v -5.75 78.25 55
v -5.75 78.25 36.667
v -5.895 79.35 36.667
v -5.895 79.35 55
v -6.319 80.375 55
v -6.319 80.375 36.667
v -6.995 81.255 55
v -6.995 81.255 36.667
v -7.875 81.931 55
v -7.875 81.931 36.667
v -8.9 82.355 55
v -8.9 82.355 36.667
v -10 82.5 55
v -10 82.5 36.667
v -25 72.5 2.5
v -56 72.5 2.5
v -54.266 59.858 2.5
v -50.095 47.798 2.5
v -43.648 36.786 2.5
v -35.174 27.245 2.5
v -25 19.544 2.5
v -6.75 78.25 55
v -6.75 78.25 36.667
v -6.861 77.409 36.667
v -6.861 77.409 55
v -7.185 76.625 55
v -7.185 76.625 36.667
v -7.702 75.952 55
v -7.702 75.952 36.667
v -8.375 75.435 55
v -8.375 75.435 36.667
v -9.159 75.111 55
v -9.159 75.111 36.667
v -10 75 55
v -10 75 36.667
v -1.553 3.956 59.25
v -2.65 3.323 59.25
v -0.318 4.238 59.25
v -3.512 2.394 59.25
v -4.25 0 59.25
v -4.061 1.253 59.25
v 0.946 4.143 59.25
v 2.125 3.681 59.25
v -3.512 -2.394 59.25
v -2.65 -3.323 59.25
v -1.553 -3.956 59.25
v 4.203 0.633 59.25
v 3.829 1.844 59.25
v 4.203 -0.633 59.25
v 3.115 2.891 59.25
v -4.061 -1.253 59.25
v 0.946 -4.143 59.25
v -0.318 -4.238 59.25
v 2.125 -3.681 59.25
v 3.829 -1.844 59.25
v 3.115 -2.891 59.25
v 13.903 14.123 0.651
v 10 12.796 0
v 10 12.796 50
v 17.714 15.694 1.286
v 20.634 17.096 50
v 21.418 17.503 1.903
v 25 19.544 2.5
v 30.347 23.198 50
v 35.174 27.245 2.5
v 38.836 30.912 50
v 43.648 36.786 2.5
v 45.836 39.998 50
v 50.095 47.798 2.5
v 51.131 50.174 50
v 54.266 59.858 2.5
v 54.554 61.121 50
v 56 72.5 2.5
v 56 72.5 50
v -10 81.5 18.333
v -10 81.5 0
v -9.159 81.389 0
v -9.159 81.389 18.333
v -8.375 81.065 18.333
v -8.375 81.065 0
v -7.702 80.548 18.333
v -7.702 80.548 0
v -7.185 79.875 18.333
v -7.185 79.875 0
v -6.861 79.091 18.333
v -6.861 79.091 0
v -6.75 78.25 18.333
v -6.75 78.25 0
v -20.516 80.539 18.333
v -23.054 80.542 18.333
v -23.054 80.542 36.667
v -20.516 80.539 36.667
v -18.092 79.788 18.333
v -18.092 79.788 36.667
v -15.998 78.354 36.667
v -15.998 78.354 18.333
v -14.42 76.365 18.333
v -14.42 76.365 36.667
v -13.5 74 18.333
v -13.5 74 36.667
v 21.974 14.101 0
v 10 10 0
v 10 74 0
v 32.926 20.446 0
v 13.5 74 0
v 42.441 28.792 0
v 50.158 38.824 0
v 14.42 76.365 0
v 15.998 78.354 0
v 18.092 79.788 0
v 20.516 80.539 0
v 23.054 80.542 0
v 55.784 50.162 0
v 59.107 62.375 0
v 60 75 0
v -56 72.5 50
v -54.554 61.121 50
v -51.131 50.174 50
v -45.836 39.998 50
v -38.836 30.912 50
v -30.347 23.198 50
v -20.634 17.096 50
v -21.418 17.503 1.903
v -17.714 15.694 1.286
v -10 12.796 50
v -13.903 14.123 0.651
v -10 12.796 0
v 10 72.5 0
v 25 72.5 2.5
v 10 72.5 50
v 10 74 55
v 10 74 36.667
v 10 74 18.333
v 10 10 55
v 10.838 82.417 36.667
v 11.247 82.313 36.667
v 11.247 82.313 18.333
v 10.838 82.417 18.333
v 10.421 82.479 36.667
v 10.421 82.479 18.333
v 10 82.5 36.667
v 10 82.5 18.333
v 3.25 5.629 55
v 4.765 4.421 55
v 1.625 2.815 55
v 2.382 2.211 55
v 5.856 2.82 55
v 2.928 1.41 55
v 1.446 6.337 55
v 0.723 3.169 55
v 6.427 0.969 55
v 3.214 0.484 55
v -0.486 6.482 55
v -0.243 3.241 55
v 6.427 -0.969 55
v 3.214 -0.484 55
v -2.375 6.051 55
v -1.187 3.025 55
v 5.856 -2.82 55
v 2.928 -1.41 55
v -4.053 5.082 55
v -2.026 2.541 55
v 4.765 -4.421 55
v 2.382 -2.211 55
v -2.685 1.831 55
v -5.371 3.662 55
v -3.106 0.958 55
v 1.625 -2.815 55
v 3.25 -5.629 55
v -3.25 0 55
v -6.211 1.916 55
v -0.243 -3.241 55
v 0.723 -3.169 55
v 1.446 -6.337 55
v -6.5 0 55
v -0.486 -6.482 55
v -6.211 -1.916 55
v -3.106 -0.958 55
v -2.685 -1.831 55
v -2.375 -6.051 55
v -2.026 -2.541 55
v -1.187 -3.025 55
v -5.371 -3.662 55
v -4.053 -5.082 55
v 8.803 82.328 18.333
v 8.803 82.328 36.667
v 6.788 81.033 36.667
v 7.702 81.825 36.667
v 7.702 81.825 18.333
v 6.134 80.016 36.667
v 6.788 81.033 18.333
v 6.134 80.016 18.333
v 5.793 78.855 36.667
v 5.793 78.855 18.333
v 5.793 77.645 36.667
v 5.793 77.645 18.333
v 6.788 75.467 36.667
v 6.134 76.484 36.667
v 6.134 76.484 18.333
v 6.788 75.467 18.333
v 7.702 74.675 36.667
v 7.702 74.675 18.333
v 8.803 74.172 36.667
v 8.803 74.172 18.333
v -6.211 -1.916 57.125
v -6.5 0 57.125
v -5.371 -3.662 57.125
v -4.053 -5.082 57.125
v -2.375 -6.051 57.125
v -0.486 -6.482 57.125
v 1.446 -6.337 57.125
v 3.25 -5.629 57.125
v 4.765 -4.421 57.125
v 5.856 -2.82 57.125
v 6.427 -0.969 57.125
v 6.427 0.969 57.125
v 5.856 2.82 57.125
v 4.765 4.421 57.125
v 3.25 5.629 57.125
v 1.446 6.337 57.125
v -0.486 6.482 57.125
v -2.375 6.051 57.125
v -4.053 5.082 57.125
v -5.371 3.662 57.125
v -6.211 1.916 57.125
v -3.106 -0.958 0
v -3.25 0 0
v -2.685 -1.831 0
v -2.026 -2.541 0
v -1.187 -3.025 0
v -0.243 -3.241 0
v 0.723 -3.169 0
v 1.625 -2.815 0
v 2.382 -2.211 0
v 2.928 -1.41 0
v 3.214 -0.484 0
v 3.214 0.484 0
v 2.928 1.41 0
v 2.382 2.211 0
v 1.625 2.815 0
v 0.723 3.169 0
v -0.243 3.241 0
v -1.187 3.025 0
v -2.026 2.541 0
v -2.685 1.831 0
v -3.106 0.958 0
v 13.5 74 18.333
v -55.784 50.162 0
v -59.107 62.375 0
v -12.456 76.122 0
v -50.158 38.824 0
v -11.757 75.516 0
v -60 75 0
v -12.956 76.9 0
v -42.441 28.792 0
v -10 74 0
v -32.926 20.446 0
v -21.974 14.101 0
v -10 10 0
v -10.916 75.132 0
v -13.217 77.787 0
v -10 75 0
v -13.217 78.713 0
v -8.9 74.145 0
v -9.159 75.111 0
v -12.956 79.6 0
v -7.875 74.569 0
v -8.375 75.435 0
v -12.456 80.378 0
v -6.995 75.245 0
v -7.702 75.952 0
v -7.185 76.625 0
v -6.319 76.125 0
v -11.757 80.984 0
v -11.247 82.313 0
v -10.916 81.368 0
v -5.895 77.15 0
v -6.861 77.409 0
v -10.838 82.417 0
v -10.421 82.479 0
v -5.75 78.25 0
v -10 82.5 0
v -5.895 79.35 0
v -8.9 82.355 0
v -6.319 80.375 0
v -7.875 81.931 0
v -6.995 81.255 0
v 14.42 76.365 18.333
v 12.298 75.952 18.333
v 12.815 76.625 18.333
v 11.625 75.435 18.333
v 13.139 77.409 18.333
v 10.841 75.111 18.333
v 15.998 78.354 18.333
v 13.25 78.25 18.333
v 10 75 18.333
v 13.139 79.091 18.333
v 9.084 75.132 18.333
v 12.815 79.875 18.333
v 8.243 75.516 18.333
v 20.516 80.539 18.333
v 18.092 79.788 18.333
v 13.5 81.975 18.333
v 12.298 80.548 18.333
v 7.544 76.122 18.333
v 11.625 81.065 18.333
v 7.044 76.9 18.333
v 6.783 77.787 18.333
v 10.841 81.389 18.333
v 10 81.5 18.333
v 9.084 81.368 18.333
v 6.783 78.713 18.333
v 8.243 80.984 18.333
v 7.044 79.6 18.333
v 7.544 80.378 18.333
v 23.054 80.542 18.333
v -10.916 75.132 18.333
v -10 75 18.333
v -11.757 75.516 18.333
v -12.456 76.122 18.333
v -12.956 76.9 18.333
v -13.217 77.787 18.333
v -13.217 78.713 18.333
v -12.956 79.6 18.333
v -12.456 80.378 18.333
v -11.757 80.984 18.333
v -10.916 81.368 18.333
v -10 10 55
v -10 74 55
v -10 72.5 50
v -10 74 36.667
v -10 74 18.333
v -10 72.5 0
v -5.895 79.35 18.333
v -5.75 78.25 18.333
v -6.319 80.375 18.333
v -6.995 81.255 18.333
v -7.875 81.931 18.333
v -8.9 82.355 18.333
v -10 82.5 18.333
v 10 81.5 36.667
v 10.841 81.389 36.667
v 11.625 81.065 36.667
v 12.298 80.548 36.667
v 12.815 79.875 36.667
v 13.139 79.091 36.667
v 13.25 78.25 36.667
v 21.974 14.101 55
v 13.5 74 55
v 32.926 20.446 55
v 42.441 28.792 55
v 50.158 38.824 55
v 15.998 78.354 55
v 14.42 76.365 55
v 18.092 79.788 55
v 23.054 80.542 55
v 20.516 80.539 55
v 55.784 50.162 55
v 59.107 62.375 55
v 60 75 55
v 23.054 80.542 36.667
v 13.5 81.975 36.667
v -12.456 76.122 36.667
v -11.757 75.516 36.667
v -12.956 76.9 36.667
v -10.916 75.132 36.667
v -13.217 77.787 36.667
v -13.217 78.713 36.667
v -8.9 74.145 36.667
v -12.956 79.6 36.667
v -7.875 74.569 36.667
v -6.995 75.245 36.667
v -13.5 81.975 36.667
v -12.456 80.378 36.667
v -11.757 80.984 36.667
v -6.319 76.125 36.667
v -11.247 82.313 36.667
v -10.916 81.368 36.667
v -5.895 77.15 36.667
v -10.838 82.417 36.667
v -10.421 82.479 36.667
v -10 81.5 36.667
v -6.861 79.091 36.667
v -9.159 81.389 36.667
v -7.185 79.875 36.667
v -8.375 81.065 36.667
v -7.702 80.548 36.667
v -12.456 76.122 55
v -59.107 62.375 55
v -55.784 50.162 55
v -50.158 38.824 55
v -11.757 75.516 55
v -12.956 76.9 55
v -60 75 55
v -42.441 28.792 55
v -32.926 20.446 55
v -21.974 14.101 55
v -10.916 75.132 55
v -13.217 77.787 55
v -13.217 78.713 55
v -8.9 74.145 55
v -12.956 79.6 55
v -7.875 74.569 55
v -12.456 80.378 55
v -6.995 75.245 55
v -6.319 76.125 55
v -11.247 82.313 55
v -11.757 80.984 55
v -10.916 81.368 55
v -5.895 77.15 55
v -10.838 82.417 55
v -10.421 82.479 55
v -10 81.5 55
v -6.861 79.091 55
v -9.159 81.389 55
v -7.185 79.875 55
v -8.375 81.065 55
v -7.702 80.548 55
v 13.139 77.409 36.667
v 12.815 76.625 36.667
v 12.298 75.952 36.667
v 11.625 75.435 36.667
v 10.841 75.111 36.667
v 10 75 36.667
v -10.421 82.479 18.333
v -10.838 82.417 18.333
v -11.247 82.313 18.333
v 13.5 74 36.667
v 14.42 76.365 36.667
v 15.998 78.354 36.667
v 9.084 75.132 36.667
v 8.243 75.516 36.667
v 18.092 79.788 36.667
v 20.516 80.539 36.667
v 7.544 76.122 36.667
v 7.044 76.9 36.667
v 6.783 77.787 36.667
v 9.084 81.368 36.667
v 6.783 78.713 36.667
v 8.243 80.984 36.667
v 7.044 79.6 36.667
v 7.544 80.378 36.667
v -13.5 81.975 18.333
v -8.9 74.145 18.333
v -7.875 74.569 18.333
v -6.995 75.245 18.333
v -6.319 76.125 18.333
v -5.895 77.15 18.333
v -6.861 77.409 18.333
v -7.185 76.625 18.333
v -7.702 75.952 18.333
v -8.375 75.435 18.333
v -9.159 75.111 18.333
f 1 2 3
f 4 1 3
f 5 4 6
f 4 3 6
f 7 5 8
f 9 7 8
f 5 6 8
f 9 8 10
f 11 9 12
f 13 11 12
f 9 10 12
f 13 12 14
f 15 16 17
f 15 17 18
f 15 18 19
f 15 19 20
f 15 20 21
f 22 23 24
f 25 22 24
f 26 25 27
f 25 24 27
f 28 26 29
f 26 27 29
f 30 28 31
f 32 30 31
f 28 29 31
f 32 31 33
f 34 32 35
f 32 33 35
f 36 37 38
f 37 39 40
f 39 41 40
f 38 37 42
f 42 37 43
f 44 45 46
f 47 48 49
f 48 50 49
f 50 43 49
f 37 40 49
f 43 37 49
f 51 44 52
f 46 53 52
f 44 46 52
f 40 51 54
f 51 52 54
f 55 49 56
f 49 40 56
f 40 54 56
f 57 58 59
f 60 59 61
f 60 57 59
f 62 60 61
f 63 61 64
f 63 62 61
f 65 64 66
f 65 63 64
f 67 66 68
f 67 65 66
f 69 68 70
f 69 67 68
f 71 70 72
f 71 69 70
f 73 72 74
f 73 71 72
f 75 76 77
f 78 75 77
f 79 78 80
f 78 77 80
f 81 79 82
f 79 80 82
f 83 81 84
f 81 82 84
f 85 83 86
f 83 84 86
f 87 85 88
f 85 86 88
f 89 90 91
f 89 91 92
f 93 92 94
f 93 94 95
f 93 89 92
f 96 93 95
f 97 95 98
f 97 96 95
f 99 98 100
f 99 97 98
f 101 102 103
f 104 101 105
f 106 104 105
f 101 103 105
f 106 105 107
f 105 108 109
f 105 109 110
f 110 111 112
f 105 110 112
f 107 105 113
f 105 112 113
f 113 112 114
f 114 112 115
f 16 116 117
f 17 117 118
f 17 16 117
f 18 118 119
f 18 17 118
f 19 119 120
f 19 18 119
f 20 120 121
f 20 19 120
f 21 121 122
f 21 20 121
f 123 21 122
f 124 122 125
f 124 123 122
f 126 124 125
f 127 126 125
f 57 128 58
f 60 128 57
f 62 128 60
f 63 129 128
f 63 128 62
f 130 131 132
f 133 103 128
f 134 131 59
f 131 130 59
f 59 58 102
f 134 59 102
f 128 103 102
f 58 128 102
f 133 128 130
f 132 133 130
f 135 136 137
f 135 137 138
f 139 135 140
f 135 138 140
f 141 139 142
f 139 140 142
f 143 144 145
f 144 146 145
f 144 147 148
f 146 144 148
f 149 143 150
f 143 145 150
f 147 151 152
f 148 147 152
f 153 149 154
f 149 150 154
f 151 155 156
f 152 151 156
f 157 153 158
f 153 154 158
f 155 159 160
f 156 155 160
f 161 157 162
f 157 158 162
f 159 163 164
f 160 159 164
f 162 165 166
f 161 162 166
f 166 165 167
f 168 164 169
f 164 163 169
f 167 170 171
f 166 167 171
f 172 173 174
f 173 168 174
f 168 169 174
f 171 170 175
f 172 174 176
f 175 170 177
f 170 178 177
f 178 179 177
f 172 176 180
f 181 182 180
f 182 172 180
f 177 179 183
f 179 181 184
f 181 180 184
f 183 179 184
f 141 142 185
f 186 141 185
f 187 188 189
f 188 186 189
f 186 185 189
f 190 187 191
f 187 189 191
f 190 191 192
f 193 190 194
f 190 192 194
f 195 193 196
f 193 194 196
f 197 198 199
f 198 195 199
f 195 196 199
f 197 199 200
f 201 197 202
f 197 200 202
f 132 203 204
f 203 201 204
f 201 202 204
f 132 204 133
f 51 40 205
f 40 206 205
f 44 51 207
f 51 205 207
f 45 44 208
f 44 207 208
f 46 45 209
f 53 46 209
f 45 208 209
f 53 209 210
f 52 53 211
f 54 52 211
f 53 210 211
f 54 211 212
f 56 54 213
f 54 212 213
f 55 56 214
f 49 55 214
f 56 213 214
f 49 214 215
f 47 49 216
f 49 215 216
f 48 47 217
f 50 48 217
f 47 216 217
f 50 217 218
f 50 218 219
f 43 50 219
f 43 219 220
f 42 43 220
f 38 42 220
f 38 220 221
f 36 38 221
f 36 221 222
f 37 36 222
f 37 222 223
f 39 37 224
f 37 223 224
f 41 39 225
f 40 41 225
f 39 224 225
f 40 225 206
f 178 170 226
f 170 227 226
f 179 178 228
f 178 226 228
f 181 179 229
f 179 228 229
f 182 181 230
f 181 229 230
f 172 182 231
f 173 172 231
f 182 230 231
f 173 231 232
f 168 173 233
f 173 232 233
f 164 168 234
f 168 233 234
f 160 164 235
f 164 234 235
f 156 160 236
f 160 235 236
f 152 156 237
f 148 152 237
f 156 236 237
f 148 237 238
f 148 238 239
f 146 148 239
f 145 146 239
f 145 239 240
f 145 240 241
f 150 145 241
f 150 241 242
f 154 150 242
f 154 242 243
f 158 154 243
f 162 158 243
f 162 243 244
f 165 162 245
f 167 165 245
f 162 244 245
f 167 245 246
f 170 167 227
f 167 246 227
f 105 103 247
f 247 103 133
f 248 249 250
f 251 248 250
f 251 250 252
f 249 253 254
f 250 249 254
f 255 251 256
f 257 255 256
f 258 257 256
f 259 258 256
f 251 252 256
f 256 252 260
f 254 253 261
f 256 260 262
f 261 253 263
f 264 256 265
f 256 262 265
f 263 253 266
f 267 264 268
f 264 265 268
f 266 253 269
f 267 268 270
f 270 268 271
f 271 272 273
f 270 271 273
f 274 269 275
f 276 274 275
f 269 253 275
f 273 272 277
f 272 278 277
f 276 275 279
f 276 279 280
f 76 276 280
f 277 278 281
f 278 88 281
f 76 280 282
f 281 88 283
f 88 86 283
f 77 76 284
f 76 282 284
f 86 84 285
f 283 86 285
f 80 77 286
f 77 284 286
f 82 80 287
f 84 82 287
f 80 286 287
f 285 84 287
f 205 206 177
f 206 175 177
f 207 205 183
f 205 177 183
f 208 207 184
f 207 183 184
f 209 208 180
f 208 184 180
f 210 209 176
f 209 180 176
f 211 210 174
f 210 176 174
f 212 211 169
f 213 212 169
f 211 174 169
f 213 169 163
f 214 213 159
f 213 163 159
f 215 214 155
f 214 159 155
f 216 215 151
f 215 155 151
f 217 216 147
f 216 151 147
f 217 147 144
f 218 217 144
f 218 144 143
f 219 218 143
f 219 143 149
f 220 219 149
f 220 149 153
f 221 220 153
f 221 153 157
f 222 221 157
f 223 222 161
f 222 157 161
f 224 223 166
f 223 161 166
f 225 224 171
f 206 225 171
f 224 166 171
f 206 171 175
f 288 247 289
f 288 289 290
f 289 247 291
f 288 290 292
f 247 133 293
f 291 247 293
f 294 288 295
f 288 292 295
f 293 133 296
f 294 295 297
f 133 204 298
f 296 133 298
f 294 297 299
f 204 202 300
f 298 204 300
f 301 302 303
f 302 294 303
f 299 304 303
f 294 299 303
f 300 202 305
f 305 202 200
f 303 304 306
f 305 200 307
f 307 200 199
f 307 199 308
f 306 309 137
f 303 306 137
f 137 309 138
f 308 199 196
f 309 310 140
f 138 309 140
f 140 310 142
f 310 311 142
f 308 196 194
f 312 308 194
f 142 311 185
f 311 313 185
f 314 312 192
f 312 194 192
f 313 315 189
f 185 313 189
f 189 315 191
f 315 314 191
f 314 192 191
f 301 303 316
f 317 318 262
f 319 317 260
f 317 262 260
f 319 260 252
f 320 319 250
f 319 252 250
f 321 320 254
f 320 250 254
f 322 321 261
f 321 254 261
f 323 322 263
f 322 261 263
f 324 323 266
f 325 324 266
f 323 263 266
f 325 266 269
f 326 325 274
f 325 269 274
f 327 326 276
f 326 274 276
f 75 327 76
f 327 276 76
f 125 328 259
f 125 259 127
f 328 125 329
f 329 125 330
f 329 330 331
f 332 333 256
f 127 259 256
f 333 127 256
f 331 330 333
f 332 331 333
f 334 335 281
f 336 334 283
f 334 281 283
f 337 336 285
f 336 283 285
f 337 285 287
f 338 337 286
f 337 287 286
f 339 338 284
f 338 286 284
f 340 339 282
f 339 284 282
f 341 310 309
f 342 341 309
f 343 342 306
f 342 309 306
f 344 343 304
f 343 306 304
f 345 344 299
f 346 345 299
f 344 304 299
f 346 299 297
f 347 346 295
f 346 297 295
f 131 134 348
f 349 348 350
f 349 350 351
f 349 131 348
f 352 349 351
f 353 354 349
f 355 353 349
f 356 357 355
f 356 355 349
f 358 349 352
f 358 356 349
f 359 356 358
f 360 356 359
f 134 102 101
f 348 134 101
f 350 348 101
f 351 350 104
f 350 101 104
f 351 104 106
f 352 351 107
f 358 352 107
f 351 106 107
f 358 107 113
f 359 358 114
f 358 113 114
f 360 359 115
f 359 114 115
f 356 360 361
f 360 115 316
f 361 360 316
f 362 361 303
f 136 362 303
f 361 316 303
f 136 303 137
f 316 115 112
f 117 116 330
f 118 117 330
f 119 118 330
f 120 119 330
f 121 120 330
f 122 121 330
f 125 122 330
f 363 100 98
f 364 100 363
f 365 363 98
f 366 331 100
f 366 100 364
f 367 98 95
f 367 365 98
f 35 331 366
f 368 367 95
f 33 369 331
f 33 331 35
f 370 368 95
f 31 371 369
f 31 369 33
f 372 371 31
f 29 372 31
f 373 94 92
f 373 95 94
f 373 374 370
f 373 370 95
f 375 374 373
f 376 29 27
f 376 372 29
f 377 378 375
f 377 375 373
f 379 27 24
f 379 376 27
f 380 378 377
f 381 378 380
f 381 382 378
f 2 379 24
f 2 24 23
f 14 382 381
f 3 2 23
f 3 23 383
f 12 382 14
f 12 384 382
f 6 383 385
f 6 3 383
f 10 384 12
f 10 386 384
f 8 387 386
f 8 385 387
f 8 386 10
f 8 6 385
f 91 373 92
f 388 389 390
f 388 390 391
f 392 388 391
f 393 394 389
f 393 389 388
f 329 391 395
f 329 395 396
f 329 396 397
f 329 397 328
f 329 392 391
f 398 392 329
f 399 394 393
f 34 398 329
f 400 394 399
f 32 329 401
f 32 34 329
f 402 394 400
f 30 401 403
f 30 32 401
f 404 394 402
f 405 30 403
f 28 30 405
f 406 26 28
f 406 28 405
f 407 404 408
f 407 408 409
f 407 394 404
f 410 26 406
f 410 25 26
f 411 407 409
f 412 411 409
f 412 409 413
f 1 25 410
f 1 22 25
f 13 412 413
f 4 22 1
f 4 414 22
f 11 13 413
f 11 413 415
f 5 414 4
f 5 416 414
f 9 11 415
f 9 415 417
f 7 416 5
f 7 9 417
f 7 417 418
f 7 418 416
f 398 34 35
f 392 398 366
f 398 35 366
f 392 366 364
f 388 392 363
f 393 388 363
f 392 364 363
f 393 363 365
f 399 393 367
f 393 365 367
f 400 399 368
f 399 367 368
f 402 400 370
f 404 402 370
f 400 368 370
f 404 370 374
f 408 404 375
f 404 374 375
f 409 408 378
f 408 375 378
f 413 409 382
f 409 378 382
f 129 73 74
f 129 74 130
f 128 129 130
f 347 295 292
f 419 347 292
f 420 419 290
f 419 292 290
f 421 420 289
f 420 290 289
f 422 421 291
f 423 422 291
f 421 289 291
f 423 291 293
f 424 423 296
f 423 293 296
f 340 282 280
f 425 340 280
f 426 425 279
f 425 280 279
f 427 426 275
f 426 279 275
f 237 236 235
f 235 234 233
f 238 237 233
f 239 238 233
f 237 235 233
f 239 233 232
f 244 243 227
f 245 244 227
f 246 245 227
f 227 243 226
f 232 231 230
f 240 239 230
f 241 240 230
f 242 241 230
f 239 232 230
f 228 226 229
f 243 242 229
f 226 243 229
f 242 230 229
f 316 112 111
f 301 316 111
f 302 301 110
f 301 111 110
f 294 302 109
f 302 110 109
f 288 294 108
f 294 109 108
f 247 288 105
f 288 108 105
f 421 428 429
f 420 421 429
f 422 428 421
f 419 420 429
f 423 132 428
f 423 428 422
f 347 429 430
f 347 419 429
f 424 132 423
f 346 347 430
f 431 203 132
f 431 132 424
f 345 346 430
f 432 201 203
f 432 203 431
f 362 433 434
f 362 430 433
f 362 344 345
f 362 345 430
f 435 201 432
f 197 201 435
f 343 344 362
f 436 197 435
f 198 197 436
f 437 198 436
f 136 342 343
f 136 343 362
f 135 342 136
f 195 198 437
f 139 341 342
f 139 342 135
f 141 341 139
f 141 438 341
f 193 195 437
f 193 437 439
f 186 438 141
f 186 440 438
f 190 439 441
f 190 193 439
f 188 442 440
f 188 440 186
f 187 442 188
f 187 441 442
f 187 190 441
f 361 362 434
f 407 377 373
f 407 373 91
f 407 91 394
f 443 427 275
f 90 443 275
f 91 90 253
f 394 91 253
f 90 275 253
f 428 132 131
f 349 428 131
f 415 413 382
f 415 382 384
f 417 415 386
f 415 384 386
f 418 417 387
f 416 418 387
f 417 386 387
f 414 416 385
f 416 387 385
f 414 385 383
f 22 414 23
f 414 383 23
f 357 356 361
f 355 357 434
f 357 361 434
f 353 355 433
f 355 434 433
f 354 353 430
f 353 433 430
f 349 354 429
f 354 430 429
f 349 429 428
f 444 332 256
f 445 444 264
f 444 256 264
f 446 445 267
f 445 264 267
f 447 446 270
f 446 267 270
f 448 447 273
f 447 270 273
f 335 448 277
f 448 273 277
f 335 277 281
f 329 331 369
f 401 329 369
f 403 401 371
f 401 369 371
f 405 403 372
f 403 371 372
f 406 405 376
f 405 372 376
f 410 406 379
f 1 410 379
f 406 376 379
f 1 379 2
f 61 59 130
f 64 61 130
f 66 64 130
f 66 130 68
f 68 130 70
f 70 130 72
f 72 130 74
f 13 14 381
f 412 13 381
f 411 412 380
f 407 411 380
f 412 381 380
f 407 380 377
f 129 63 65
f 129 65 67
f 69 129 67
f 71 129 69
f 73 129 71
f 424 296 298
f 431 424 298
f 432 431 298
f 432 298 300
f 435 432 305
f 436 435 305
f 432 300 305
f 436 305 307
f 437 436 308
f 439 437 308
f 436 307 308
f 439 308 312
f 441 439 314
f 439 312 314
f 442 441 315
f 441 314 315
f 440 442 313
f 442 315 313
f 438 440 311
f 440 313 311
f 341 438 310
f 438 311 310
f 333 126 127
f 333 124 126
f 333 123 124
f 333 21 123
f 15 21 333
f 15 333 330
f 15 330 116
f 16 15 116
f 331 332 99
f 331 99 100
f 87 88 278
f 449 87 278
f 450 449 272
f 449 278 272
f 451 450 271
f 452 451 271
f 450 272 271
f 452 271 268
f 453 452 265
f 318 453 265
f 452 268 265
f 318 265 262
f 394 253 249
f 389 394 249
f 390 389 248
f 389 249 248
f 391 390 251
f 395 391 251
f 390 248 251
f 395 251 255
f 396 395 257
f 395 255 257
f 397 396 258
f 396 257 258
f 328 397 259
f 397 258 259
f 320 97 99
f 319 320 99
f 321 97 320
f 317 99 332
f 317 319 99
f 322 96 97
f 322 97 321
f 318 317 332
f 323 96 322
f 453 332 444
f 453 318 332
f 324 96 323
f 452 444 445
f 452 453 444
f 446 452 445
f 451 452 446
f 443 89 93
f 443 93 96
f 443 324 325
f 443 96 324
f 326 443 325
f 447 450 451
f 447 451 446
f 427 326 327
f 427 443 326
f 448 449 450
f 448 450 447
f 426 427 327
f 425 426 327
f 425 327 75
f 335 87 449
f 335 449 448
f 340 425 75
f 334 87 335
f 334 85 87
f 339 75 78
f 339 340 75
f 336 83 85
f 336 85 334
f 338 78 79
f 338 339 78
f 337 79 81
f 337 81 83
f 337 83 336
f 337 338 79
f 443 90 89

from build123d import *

# Parameters (mm, degrees)
F2_DEPTH      = 55
F3_START      = 2.5
F3_DEPTH      = 47.5
F4_SIZE2      = 14.99999
F4_SIZE       = 2.49999
F4_2_SIZE2    = 14.99999
F4_2_SIZE     = 2.49999
F7_DEPTH      = 55
F8_W          = 8.5
F8_H          = 18.3333333333
F9_DEPTH      = 13.5
F10_DEPTH     = 13.5
F13_T1_DEPTH  = 42.4854968764
F13_T3_DEPTH  = 42.4854968764
F13_T8_DEPTH  = 66.6376604194
F13_T13_DEPTH = 66.6376604194
F14_T1_DEPTH  = 18.3333333333


# Not quite as in the source:
# - a fillet or chamfer that OpenCascade refuses, or shapes differently, is made with other operations: its cross-section is extruded or revolved along the edge and cut away or added
# - two fillets or chamfers of one size are made in one step
# - a fillet or chamfer is up to 0.001 mm smaller than in the source, because OpenCascade refuses the exact size


with BuildPart() as f2:
    # F0 (on Top) → F2 (new body)
    with BuildSketch(Plane.XY):
        with BuildLine():
            ThreePointArc((-60, 75), (-46.5440908417, 33.6199301218), (-10, 10))
            Line((-10, 10), (-10, 75))
            Line((-10, 75), (-60, 75))
        make_face()
    extrude(amount=F2_DEPTH)


with BuildPart() as f2b:
    # F0 (on Top) → F2, piece 2 (new body)
    with BuildSketch(Plane.XY):
        with BuildLine():
            ThreePointArc((10, 10), (46.5440908417, 33.6199301218), (60, 75))
            Line((60, 75), (10, 75))
            Line((10, 75), (10, 10))
        make_face()
    extrude(amount=F2_DEPTH)


with BuildPart() as f3_tool:
    # F1 (on Top) → F3 (new body)
    with BuildSketch(Plane.XY.offset(F3_START)):
        with BuildLine():
            Line((-9, 72.5), (-56, 72.5))
            ThreePointArc((-56, 72.5), (-42.2168279916, 34.8884847399), (-9, 12.5))
            Line((-9, 12.5), (-9, 72.5))
        make_face()
        with BuildLine():
            ThreePointArc((9, 12.5), (42.2168279916, 34.8884847399), (56, 72.5))
            Line((56, 72.5), (9, 72.5))
            Line((9, 72.5), (9, 12.5))
        make_face()
    extrude(amount=F3_DEPTH)


with BuildPart() as f2_1:
    add(f2.part)

    # F3: cut by f3_tool
    add(f3_tool.part, mode=Mode.SUBTRACT)

    # F4#2 (size 2.5 and 15 in the source; OpenCascade refuses exactly that, so slightly less here)
    f4_2_edges = [f2_1.edges().sort_by_distance(p)[0] for p in [
        (-10, 42.648042, 2.5),
    ]]
    chamfer(f4_2_edges, length=F4_2_SIZE, length2=F4_2_SIZE2)

    # F6 (on Top) → F7 (join, through all)
    with BuildSketch(Plane.XY):
        with BuildLine():
            ThreePointArc((-12.7386127875, 75), (-8.2078789587, 74.3963261459), (-5.75, 78.25))
            ThreePointArc((-5.75, 78.25), (-6.99479618, 81.25520382), (-10, 82.5))
            Line((-10, 82.5), (-10, 81.5))
            ThreePointArc((-10, 81.5), (-7.7019029611, 80.5480970389), (-6.75, 78.25))
            ThreePointArc((-6.75, 78.25), (-7.7019029611, 75.9519029611), (-10, 75))
            Line((-10, 75), (-12.7386127875, 75))
        make_face()
        with BuildLine():
            Line((-11.2469437653, 82.3129584352), (-10, 82.5))
            ThreePointArc((-10, 82.5), (-10.630446925, 82.4529794997), (-11.2469437653, 82.3129584352))
        make_face()
        with BuildLine():
            Line((-10, 81.5), (-10, 82.5))
            Line((-10, 82.5), (-11.2469437653, 82.3129584352))
            ThreePointArc((-11.2469437653, 82.3129584352), (-14.1642532977, 79.0994083072), (-12.7386127875, 75))
            Line((-12.7386127875, 75), (-10, 75))
            ThreePointArc((-10, 75), (-13.25, 78.25), (-10, 81.5))
        make_face()
        with BuildLine():
            Line((-60, 75), (-12.7386127875, 75))
            ThreePointArc((-12.7386127875, 75), (-14.1642532977, 79.0994083072), (-11.2469437653, 82.3129584352))
            Line((-11.2469437653, 82.3129584352), (-60, 75))
        make_face()
    extrude(amount=F7_DEPTH)

    # F8 (on Right) → F10 (cut)
    with BuildSketch(Plane.YZ):
        with Locations((78.25, 27.5)):
            Rectangle(F8_W, F8_H)
    extrude(amount=-F10_DEPTH, mode=Mode.SUBTRACT)

    # F14: fillet of radius 8.5 on 1 edges, made by hand

    # F14_s2 → F14_t1 (cut)
    with BuildSketch(Plane.XY.offset(18.3333333333)):
        with BuildLine():
            ThreePointArc((-23.0539810113, 80.5419028483), (-16.9907899078, 79.1493553646), (-13.5, 74))
            Line((-13.5, 74), (-13.5, 81.975))
            Line((-13.5, 81.975), (-23.0539810113, 80.5419028483))
        make_face()
    extrude(amount=F14_T1_DEPTH, mode=Mode.SUBTRACT)


with BuildPart() as f2b_1:
    add(f2b.part)

    # F3: cut by f3_tool
    add(f3_tool.part, mode=Mode.SUBTRACT)

    # F4 (size 2.5 and 15 in the source; OpenCascade refuses exactly that, so slightly less here)
    f4_edges = [f2b_1.edges().sort_by_distance(p)[0] for p in [
        (10, 42.648042, 2.5),
    ]]
    chamfer(f4_edges, length=F4_SIZE, length2=F4_SIZE2)

    # F6 (on Top) → F7, piece 2 (join, through all)
    with BuildSketch(Plane.XY):
        with BuildLine():
            ThreePointArc((12.7386127875, 75), (13.8536738541, 76.4578789587), (14.25, 78.25))
            ThreePointArc((14.25, 78.25), (13.4177486012, 80.7761620096), (11.2469437653, 82.3129584352))
            Line((11.2469437653, 82.3129584352), (10, 82.5))
            Line((10, 82.5), (10, 81.5))
            ThreePointArc((10, 81.5), (12.2980970389, 80.5480970389), (13.25, 78.25))
            ThreePointArc((13.25, 78.25), (12.2980970389, 75.9519029611), (10, 75))
            Line((10, 75), (12.7386127875, 75))
        make_face()
        with BuildLine():
            ThreePointArc((11.2469437653, 82.3129584352), (13.4177486012, 80.7761620096), (14.25, 78.25))
            ThreePointArc((14.25, 78.25), (13.8536738541, 76.4578789587), (12.7386127875, 75))
            Line((12.7386127875, 75), (60, 75))
            Line((60, 75), (11.2469437653, 82.3129584352))
        make_face()
        with BuildLine():
            Line((10, 82.5), (11.2469437653, 82.3129584352))
            ThreePointArc((11.2469437653, 82.3129584352), (10.630446925, 82.4529794997), (10, 82.5))
        make_face()
        with BuildLine():
            ThreePointArc((10, 82.5), (6.0078201443, 76.7922620263), (12.7386127875, 75))
            Line((12.7386127875, 75), (10, 75))
            ThreePointArc((10, 75), (6.75, 78.25), (10, 81.5))
            Line((10, 81.5), (10, 82.5))
        make_face()
    extrude(amount=F7_DEPTH)

    # F8 (on Right) → F9 (cut)
    with BuildSketch(Plane.YZ):
        with Locations((78.25, 45.8333333333)):
            Rectangle(F8_W, F8_H)
        with Locations((78.25, 9.1666666667)):
            Rectangle(F8_W, F8_H)
    extrude(amount=F9_DEPTH, mode=Mode.SUBTRACT)

    # F13: fillet of radius 8.5 on 2 edges, made by hand

    # F13_s2 → F13_t1 (cut)
    with BuildSketch(Plane.XY.offset(36.6666666667)):
        with BuildLine():
            ThreePointArc((23.0539810113, 80.5419028483), (16.9907899078, 79.1493553646), (13.5, 74))
            Line((13.5, 74), (13.5, 81.975))
            Line((13.5, 81.975), (23.0539810113, 80.5419028483))
        make_face()
    extrude(amount=F13_T1_DEPTH, mode=Mode.SUBTRACT)

    # F13_s4 → F13_t3 (cut)
    with BuildSketch(Plane.XY.offset(-24.152163543)):
        with BuildLine():
            ThreePointArc((23.0539810113, 80.5419028483), (16.9907899078, 79.1493553646), (13.5, 74))
            Line((13.5, 74), (13.5, 81.975))
            Line((13.5, 81.975), (23.0539810113, 80.5419028483))
        make_face()
    extrude(amount=F13_T3_DEPTH, mode=Mode.SUBTRACT)


with BuildPart() as f12:
    # F11 (on Front) → F12 (revolve)
    with BuildSketch(Plane.XZ):
        Polygon((-3.25, 0), (0, 0), (0, 59.25), (-4.25, 59.25), (-6.5, 57.125), (-6.5, 55), (-3.25, 55), align=None)
    revolve(axis=Axis((0, 0, 29.625), (0, 0, 1)))


with BuildPart() as f13_tool6:
    # F13_s7 → F13_t8 (new body)
    with BuildSketch(Plane.XY.offset(12.5145031236)):
        with BuildLine():
            ThreePointArc((23.0539810113, 80.5419028483), (16.9907899078, 79.1493553646), (13.5, 74))
            Line((13.5, 74), (13.5, 81.975))
            Line((13.5, 81.975), (23.0539810113, 80.5419028483))
        make_face()
    extrude(amount=F13_T8_DEPTH)

    split(bisect_by=Plane.XY.offset(18.3333333333), keep=Keep.BOTTOM)


with BuildPart() as f2b_2:
    add(f2b_1.part)

    # F13_t5: cut F13_tool6
    add(f13_tool6.part, mode=Mode.SUBTRACT)


with BuildPart() as f13_tool11:
    # F13_s12 → F13_t13 (new body)
    with BuildSketch(Plane.XY.offset(-24.152163543)):
        with BuildLine():
            ThreePointArc((23.0539810113, 80.5419028483), (16.9907899078, 79.1493553646), (13.5, 74))
            Line((13.5, 74), (13.5, 81.975))
            Line((13.5, 81.975), (23.0539810113, 80.5419028483))
        make_face()
    extrude(amount=F13_T13_DEPTH)

    split(bisect_by=Plane.XY.offset(36.6666666667), keep=Keep.TOP)


with BuildPart() as f2b_3:
    add(f2b_2.part)

    # F13_t10: cut F13_tool11
    add(f13_tool11.part, mode=Mode.SUBTRACT)


solid = Compound([f2_1.part, f12.part, f2b_3.part])
